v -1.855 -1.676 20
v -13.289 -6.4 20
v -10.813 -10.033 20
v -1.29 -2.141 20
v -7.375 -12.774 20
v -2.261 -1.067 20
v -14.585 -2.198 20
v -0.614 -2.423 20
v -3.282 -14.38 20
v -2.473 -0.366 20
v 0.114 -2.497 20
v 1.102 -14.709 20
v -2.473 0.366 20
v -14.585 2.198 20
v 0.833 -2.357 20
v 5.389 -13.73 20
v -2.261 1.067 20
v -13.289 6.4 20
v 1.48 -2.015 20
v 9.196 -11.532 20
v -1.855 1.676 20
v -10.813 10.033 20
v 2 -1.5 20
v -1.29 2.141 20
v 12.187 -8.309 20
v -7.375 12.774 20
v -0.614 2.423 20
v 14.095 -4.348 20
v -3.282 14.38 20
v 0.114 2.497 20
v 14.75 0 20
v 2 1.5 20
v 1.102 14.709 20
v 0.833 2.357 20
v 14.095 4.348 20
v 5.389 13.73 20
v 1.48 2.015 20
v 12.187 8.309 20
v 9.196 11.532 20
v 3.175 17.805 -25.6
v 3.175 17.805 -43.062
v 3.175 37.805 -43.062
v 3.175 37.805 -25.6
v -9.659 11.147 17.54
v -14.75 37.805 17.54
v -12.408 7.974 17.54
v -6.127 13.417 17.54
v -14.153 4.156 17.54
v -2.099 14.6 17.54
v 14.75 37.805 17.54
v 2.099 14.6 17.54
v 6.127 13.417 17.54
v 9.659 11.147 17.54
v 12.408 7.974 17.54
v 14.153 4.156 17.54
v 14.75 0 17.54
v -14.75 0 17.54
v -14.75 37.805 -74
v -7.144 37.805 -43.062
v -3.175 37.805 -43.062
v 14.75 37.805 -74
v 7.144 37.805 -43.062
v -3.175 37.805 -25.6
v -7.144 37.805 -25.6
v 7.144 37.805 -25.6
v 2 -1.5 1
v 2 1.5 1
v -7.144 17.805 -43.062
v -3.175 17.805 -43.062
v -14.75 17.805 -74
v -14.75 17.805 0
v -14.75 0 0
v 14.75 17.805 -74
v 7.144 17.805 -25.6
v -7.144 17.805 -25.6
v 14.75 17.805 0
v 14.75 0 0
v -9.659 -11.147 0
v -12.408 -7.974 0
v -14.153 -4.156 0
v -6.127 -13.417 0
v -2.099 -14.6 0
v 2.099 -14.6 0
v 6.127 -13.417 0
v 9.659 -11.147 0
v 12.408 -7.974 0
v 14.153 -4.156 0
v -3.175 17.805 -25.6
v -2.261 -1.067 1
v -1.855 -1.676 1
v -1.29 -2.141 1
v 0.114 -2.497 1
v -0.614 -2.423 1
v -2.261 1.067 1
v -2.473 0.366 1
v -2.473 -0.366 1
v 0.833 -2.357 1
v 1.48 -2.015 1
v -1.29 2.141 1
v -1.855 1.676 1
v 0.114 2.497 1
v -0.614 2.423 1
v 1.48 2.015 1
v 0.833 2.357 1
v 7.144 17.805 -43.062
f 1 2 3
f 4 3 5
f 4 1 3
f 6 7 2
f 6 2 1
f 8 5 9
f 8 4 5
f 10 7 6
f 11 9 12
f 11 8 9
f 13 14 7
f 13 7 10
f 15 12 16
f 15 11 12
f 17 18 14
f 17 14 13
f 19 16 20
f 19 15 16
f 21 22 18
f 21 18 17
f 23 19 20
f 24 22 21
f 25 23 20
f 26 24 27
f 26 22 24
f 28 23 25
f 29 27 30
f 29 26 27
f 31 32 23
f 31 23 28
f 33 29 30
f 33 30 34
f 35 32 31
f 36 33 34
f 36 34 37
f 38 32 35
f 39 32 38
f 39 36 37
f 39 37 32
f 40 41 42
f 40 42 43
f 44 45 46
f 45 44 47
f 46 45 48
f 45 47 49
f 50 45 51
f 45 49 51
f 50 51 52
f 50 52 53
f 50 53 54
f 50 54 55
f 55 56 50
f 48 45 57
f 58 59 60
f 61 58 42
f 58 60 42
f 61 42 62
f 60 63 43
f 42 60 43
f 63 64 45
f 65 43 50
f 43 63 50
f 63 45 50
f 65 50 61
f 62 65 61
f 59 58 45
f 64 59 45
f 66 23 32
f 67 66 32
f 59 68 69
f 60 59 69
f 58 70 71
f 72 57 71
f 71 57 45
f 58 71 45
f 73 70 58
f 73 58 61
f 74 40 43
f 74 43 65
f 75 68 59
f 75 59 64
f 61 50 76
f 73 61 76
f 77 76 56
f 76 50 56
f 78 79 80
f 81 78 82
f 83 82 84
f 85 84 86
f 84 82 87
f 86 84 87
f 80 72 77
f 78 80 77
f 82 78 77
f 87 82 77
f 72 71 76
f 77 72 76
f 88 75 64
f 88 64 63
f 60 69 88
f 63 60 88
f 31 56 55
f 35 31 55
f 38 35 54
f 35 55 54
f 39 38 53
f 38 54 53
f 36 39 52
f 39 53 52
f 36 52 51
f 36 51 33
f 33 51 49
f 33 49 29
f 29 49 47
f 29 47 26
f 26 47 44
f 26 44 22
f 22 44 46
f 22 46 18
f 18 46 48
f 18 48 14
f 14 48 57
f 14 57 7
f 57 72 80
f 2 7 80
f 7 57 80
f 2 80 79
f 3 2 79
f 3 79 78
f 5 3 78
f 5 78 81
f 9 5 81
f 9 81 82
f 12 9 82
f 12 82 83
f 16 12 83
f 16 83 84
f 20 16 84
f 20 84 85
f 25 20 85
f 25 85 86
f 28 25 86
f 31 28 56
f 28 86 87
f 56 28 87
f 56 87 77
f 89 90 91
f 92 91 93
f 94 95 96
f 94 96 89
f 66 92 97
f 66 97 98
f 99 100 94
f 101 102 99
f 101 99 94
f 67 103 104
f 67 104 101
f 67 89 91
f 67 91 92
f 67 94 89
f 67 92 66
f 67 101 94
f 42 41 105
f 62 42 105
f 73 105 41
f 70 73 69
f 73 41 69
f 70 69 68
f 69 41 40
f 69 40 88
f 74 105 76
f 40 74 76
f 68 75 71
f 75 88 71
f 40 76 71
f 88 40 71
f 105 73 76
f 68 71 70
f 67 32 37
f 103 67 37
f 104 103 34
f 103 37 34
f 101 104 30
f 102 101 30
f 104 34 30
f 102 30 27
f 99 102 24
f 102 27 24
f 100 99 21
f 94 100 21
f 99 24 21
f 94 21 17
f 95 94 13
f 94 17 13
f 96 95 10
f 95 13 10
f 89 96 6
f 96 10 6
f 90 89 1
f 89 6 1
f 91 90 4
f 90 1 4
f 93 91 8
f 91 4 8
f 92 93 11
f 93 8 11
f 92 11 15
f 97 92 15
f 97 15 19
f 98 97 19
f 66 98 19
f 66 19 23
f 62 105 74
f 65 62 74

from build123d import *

# Parameters (mm, degrees)
F0_R     = 14.75
F1_DEPTH = 20
F3_DEPTH = 17.53955
F4_DEPTH = 74
F6_DEPTH = 19
F7_W     = 3.96875
F7_H     = 17.4625
F8_DEPTH = 20.001


with BuildPart() as f1:
    # F0 (on Top) → F1 (new body)
    with BuildSketch(Plane.XY):
        Circle(F0_R)
    extrude(amount=F1_DEPTH)

    # F2 (on face) → F3 (join)
    with BuildSketch(Plane(origin=(0, 0, 0), x_dir=(1, 0, 0), z_dir=(0, 0, -1))):
        with BuildLine():
            Line((0, -14.75), (0, -17.8051246337))
            Line((0, -17.8051246337), (14.75, -17.8051246337))
            Line((14.75, -17.8051246337), (14.75, 0))
            ThreePointArc((14.75, 0), (10.4298250225, -10.4298250225), (0, -14.75))
        make_face()
        with BuildLine():
            Line((-14.75, -17.8051246337), (0, -17.8051246337))
            Line((0, -17.8051246337), (0, -14.75))
            ThreePointArc((0, -14.75), (-10.4298250225, -10.4298250225), (-14.75, 0))
            Line((-14.75, 0), (-14.75, -17.8051246337))
        make_face()
        with BuildLine():
            ThreePointArc((-14.75, 0), (-10.4298250225, -10.4298250225), (0, -14.75))
            Line((0, -14.75), (0, 0))
            Line((0, 0), (-14.75, 0))
        make_face()
        with BuildLine():
            Line((0, 0), (0, -14.75))
            ThreePointArc((0, -14.75), (10.4298250225, -10.4298250225), (14.75, 0))
            Line((14.75, 0), (0, 0))
        make_face()
        Polygon((14.75, -17.8051246337), (0, -17.8051246337), (-14.75, -17.8051246337), (-14.75, -37.8051246337), (14.75, -37.8051246337), align=None)
    extrude(amount=-F3_DEPTH)

    # F2 (on face) → F4 (join)
    with BuildSketch(Plane(origin=(0, 0, 0), x_dir=(1, 0, 0), z_dir=(0, 0, -1))):
        Polygon((14.75, -17.8051246337), (0, -17.8051246337), (-14.75, -17.8051246337), (-14.75, -37.8051246337), (14.75, -37.8051246337), align=None)
    extrude(amount=F4_DEPTH)

    # F5 (on face) → F6 (cut)
    with BuildSketch(Plane.XY.offset(20)):
        with BuildLine():
            Line((2, -1.5), (2, 1.5))
            ThreePointArc((2, 1.5), (-2.5, 0), (2, -1.5))
        make_face()
    extrude(amount=-F6_DEPTH, mode=Mode.SUBTRACT)

    # F7 (on face) → F8 (cut, through all)
    with BuildSketch(Plane.XZ.offset(-17.8051246337)):
        with Locations((5.159375, -34.33125)):
            Rectangle(F7_W, F7_H)
        with Locations((-5.159375, -34.33125)):
            Rectangle(F7_W, F7_H)
    extrude(amount=-F8_DEPTH, mode=Mode.SUBTRACT)


solid = f1.part
